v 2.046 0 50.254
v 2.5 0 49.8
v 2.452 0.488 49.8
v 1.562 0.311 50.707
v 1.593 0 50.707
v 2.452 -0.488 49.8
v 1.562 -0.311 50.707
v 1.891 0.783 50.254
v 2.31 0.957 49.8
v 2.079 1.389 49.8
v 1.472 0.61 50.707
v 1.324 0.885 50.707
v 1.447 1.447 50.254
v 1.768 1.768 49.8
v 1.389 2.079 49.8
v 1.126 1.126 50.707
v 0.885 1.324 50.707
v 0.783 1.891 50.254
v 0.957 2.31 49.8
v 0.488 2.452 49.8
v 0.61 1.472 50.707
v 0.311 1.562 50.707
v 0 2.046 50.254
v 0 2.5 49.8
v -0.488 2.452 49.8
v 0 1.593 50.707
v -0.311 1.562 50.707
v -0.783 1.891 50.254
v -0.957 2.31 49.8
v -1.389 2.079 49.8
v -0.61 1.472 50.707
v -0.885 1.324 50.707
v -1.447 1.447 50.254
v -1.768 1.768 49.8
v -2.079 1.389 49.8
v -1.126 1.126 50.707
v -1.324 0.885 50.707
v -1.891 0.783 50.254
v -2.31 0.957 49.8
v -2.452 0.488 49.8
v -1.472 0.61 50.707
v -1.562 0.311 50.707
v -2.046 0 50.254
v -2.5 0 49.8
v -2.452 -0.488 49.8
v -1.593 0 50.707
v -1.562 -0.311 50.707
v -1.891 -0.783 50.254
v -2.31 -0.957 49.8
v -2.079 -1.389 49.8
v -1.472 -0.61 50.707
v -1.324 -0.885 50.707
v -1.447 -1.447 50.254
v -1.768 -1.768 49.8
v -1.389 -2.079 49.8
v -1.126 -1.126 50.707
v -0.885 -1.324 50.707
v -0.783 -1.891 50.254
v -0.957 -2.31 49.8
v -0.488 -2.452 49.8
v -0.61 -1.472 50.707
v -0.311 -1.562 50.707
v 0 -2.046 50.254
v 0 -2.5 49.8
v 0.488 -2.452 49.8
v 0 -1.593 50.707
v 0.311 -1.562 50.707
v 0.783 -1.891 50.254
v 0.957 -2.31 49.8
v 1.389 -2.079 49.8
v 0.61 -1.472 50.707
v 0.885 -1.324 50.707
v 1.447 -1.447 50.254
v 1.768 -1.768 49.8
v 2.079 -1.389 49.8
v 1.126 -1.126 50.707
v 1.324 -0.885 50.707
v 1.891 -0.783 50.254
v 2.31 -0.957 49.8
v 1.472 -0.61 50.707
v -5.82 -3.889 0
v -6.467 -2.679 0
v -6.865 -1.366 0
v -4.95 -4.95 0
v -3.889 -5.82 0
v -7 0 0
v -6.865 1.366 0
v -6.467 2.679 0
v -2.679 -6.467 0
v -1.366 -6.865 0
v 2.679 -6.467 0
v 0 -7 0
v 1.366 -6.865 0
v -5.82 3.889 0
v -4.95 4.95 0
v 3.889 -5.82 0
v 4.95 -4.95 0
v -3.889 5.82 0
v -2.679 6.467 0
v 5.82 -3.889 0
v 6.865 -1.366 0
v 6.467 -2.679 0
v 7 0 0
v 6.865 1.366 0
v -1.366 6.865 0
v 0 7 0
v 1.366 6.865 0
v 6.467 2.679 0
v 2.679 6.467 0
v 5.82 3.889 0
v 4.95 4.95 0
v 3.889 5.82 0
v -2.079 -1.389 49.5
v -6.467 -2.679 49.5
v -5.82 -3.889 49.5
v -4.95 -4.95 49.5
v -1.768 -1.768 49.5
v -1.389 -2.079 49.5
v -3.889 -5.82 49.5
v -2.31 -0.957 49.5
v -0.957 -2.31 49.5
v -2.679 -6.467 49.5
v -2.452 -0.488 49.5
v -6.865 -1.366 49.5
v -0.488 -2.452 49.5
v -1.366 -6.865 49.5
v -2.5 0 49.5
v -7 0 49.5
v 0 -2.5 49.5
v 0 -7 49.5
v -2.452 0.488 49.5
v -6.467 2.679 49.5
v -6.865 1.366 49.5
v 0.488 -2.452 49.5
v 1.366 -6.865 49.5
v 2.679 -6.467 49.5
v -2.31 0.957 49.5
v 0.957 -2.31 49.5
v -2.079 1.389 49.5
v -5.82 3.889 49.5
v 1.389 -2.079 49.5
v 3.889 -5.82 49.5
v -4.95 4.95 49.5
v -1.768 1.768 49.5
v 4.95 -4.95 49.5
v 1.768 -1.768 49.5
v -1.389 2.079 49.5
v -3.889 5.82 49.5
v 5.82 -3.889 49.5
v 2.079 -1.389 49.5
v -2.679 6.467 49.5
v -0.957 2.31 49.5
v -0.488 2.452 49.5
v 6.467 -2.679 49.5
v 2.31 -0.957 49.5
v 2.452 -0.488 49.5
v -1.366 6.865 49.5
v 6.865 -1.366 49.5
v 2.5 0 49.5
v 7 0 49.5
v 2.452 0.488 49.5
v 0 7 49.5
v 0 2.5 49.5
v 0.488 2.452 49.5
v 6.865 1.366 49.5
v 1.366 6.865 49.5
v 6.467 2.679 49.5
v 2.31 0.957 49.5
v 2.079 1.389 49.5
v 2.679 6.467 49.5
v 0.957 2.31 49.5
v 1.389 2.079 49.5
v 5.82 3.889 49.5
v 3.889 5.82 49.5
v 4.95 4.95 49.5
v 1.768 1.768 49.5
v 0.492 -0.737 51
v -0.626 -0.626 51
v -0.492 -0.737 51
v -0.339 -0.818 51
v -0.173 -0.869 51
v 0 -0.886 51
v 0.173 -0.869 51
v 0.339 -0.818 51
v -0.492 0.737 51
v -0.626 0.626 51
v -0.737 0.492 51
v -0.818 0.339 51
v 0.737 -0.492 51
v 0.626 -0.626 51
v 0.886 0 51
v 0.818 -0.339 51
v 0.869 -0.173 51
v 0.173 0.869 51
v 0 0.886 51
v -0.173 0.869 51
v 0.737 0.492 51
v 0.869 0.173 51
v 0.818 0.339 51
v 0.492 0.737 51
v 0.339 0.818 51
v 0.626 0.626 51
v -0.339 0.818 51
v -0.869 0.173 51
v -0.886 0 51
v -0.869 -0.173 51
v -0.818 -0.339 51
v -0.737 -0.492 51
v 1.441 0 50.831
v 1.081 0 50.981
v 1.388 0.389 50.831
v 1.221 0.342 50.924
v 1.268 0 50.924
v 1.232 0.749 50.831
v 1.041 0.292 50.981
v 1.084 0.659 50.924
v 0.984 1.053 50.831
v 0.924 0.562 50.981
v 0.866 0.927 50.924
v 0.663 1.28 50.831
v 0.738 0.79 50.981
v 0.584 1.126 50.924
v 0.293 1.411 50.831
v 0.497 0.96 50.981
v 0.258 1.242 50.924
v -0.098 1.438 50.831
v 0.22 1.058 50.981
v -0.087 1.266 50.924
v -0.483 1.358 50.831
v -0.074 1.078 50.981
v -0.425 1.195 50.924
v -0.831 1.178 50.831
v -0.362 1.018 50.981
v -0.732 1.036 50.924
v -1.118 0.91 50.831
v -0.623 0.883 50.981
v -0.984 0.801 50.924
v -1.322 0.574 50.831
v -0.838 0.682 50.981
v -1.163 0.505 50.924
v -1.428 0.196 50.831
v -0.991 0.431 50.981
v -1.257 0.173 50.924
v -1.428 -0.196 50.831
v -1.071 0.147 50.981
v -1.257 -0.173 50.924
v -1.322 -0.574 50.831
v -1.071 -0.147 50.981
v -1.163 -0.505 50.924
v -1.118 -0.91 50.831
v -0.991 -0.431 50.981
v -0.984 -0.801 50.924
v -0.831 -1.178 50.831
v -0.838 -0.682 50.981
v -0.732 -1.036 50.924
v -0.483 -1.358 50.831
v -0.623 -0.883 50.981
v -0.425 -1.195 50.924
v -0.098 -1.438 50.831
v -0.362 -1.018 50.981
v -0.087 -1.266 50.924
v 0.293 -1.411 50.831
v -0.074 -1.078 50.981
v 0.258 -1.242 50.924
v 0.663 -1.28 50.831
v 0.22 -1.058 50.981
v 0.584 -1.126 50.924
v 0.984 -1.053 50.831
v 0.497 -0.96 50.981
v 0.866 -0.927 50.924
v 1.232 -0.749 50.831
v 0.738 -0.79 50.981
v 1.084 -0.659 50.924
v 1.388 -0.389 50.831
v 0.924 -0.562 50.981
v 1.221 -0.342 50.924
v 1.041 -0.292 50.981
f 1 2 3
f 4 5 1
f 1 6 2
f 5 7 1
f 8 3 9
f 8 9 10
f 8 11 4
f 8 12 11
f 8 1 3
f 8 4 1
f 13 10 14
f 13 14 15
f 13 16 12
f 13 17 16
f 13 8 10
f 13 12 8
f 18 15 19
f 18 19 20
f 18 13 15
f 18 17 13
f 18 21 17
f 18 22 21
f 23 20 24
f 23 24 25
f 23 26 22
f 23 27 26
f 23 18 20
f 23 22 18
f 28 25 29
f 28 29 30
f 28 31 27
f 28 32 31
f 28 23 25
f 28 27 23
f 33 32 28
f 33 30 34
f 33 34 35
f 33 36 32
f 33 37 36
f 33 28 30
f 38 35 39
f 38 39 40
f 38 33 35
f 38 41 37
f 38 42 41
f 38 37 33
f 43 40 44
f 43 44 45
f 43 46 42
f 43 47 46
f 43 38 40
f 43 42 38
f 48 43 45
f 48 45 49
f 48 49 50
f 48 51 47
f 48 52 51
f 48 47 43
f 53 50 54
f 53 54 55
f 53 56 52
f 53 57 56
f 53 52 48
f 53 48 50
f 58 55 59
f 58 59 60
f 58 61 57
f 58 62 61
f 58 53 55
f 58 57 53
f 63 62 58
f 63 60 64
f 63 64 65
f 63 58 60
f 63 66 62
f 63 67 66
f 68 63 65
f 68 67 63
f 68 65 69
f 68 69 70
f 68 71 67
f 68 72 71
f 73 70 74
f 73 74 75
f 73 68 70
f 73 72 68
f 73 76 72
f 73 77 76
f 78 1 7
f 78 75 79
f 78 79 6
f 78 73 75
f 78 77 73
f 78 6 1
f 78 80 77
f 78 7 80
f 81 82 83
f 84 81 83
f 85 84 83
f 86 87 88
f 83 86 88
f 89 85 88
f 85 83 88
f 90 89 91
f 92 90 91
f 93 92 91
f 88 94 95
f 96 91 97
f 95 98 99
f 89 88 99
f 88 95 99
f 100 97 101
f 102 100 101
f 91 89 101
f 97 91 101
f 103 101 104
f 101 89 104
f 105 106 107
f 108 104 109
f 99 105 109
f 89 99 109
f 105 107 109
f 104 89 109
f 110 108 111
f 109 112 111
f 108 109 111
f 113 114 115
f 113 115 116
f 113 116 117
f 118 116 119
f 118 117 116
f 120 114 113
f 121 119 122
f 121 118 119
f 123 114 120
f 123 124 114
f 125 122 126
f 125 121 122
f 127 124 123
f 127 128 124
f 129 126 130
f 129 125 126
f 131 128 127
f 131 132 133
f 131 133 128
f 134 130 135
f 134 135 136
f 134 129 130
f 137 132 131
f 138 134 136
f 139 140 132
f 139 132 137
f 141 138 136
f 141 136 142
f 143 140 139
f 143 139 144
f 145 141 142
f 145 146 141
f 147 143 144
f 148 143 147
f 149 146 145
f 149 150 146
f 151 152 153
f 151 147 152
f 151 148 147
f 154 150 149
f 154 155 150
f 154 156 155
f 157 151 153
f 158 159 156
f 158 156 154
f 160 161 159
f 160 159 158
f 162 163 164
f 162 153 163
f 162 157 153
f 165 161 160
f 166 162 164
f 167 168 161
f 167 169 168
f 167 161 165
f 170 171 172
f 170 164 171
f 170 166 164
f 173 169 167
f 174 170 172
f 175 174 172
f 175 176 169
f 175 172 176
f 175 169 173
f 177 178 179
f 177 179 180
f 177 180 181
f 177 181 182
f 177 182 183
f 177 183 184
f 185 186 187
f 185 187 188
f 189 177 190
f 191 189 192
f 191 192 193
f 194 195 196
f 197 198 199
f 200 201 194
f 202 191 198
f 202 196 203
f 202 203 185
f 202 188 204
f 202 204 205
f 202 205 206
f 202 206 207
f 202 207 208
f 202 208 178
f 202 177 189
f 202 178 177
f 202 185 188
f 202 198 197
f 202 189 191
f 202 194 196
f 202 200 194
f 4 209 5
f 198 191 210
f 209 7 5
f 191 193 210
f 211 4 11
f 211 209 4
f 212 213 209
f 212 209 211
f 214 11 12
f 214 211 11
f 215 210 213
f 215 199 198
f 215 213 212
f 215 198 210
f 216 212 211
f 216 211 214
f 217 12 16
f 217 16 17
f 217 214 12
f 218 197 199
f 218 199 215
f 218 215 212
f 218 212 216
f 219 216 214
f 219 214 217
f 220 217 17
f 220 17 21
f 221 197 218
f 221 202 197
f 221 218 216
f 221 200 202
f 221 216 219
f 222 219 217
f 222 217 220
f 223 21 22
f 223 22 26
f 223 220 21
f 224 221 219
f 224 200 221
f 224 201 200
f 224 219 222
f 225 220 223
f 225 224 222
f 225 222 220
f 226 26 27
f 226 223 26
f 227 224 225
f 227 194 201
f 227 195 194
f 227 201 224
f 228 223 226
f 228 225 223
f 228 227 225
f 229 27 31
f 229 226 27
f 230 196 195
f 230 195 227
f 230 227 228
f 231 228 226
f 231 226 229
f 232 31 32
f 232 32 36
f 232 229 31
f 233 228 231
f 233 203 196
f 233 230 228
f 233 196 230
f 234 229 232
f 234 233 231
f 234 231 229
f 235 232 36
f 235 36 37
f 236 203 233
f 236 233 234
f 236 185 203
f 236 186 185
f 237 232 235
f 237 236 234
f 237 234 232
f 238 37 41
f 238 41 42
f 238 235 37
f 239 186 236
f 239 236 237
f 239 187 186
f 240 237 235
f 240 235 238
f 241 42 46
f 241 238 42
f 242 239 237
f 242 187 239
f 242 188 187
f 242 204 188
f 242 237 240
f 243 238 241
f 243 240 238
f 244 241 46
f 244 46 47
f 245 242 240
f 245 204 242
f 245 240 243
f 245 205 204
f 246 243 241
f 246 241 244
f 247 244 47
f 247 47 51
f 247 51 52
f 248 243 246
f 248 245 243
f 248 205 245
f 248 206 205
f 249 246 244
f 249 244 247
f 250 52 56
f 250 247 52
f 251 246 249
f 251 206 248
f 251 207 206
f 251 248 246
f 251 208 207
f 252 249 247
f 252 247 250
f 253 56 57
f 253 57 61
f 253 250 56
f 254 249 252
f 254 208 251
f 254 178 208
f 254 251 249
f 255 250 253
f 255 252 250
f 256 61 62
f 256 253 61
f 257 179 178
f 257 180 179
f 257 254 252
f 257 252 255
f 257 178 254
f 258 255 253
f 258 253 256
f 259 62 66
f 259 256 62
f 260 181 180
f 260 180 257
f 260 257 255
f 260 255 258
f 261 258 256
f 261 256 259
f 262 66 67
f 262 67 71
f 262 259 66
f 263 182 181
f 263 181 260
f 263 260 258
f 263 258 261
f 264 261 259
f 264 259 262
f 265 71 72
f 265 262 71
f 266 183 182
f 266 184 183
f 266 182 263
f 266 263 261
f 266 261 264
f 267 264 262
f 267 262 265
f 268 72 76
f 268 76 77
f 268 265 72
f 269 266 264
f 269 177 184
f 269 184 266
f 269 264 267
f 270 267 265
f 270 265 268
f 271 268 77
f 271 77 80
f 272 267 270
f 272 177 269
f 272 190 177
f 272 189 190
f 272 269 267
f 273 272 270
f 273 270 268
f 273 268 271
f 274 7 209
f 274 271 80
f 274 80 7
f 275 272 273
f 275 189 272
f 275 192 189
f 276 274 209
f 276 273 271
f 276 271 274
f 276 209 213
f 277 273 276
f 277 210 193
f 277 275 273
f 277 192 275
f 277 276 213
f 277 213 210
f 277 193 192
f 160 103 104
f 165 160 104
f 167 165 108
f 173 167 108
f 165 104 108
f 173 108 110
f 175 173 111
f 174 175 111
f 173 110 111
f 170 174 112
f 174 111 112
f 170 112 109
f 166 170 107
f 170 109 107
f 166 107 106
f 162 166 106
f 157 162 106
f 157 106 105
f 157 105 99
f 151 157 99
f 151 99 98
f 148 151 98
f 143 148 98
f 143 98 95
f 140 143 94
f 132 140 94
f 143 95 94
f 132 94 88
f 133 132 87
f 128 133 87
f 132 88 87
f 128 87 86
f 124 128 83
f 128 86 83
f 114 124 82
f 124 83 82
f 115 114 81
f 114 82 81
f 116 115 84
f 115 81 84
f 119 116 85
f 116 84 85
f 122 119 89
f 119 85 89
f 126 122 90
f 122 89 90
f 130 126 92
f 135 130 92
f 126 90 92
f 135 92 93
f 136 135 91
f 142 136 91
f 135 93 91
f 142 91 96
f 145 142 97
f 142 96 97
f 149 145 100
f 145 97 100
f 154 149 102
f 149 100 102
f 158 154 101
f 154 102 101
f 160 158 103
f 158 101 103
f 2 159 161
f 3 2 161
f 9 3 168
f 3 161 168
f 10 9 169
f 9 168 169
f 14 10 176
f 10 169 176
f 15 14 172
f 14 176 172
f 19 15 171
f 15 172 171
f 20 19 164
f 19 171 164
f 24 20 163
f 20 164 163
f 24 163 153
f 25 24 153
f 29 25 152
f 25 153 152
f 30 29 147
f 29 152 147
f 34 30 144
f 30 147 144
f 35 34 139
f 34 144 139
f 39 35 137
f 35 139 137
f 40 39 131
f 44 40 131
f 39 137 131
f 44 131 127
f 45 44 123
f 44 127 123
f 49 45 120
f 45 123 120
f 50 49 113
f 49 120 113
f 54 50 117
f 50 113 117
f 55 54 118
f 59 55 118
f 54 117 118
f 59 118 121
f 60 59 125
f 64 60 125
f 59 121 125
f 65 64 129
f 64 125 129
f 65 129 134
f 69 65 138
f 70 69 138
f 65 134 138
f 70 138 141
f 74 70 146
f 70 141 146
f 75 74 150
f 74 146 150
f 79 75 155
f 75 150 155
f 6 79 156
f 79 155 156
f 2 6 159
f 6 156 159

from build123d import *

# Parameters (mm, degrees)
SKETCH012_R  = 7
PAD007_DEPTH = 49.5
SKETCH011_R  = 2.5
PAD008_DEPTH = 1.5
CHAMFER_SIZE = 1.2
FILLET002_R  = 1


with BuildPart() as part:
    # Sketch012 → Pad007 (new body)
    with BuildSketch(Plane.XY):
        Circle(SKETCH012_R)
    extrude(amount=PAD007_DEPTH)

    # Sketch011 (on Face3 of Pad007) → Pad008 (join)
    with BuildSketch(Plane.XY.offset(49.5)):
        Circle(SKETCH011_R)
    extrude(amount=PAD008_DEPTH)

    # Chamfer
    chamfer_edges = [part.edges().sort_by_distance(p)[0] for p in [
        (-2.5, 0, 51),
    ]]
    chamfer(chamfer_edges, length=CHAMFER_SIZE)

    # Fillet002
    fillet002_edges = [part.edges().sort_by_distance(p)[0] for p in [
        (-1.3, 0, 51),
    ]]
    fillet(fillet002_edges, radius=FILLET002_R)


solid = part.part
